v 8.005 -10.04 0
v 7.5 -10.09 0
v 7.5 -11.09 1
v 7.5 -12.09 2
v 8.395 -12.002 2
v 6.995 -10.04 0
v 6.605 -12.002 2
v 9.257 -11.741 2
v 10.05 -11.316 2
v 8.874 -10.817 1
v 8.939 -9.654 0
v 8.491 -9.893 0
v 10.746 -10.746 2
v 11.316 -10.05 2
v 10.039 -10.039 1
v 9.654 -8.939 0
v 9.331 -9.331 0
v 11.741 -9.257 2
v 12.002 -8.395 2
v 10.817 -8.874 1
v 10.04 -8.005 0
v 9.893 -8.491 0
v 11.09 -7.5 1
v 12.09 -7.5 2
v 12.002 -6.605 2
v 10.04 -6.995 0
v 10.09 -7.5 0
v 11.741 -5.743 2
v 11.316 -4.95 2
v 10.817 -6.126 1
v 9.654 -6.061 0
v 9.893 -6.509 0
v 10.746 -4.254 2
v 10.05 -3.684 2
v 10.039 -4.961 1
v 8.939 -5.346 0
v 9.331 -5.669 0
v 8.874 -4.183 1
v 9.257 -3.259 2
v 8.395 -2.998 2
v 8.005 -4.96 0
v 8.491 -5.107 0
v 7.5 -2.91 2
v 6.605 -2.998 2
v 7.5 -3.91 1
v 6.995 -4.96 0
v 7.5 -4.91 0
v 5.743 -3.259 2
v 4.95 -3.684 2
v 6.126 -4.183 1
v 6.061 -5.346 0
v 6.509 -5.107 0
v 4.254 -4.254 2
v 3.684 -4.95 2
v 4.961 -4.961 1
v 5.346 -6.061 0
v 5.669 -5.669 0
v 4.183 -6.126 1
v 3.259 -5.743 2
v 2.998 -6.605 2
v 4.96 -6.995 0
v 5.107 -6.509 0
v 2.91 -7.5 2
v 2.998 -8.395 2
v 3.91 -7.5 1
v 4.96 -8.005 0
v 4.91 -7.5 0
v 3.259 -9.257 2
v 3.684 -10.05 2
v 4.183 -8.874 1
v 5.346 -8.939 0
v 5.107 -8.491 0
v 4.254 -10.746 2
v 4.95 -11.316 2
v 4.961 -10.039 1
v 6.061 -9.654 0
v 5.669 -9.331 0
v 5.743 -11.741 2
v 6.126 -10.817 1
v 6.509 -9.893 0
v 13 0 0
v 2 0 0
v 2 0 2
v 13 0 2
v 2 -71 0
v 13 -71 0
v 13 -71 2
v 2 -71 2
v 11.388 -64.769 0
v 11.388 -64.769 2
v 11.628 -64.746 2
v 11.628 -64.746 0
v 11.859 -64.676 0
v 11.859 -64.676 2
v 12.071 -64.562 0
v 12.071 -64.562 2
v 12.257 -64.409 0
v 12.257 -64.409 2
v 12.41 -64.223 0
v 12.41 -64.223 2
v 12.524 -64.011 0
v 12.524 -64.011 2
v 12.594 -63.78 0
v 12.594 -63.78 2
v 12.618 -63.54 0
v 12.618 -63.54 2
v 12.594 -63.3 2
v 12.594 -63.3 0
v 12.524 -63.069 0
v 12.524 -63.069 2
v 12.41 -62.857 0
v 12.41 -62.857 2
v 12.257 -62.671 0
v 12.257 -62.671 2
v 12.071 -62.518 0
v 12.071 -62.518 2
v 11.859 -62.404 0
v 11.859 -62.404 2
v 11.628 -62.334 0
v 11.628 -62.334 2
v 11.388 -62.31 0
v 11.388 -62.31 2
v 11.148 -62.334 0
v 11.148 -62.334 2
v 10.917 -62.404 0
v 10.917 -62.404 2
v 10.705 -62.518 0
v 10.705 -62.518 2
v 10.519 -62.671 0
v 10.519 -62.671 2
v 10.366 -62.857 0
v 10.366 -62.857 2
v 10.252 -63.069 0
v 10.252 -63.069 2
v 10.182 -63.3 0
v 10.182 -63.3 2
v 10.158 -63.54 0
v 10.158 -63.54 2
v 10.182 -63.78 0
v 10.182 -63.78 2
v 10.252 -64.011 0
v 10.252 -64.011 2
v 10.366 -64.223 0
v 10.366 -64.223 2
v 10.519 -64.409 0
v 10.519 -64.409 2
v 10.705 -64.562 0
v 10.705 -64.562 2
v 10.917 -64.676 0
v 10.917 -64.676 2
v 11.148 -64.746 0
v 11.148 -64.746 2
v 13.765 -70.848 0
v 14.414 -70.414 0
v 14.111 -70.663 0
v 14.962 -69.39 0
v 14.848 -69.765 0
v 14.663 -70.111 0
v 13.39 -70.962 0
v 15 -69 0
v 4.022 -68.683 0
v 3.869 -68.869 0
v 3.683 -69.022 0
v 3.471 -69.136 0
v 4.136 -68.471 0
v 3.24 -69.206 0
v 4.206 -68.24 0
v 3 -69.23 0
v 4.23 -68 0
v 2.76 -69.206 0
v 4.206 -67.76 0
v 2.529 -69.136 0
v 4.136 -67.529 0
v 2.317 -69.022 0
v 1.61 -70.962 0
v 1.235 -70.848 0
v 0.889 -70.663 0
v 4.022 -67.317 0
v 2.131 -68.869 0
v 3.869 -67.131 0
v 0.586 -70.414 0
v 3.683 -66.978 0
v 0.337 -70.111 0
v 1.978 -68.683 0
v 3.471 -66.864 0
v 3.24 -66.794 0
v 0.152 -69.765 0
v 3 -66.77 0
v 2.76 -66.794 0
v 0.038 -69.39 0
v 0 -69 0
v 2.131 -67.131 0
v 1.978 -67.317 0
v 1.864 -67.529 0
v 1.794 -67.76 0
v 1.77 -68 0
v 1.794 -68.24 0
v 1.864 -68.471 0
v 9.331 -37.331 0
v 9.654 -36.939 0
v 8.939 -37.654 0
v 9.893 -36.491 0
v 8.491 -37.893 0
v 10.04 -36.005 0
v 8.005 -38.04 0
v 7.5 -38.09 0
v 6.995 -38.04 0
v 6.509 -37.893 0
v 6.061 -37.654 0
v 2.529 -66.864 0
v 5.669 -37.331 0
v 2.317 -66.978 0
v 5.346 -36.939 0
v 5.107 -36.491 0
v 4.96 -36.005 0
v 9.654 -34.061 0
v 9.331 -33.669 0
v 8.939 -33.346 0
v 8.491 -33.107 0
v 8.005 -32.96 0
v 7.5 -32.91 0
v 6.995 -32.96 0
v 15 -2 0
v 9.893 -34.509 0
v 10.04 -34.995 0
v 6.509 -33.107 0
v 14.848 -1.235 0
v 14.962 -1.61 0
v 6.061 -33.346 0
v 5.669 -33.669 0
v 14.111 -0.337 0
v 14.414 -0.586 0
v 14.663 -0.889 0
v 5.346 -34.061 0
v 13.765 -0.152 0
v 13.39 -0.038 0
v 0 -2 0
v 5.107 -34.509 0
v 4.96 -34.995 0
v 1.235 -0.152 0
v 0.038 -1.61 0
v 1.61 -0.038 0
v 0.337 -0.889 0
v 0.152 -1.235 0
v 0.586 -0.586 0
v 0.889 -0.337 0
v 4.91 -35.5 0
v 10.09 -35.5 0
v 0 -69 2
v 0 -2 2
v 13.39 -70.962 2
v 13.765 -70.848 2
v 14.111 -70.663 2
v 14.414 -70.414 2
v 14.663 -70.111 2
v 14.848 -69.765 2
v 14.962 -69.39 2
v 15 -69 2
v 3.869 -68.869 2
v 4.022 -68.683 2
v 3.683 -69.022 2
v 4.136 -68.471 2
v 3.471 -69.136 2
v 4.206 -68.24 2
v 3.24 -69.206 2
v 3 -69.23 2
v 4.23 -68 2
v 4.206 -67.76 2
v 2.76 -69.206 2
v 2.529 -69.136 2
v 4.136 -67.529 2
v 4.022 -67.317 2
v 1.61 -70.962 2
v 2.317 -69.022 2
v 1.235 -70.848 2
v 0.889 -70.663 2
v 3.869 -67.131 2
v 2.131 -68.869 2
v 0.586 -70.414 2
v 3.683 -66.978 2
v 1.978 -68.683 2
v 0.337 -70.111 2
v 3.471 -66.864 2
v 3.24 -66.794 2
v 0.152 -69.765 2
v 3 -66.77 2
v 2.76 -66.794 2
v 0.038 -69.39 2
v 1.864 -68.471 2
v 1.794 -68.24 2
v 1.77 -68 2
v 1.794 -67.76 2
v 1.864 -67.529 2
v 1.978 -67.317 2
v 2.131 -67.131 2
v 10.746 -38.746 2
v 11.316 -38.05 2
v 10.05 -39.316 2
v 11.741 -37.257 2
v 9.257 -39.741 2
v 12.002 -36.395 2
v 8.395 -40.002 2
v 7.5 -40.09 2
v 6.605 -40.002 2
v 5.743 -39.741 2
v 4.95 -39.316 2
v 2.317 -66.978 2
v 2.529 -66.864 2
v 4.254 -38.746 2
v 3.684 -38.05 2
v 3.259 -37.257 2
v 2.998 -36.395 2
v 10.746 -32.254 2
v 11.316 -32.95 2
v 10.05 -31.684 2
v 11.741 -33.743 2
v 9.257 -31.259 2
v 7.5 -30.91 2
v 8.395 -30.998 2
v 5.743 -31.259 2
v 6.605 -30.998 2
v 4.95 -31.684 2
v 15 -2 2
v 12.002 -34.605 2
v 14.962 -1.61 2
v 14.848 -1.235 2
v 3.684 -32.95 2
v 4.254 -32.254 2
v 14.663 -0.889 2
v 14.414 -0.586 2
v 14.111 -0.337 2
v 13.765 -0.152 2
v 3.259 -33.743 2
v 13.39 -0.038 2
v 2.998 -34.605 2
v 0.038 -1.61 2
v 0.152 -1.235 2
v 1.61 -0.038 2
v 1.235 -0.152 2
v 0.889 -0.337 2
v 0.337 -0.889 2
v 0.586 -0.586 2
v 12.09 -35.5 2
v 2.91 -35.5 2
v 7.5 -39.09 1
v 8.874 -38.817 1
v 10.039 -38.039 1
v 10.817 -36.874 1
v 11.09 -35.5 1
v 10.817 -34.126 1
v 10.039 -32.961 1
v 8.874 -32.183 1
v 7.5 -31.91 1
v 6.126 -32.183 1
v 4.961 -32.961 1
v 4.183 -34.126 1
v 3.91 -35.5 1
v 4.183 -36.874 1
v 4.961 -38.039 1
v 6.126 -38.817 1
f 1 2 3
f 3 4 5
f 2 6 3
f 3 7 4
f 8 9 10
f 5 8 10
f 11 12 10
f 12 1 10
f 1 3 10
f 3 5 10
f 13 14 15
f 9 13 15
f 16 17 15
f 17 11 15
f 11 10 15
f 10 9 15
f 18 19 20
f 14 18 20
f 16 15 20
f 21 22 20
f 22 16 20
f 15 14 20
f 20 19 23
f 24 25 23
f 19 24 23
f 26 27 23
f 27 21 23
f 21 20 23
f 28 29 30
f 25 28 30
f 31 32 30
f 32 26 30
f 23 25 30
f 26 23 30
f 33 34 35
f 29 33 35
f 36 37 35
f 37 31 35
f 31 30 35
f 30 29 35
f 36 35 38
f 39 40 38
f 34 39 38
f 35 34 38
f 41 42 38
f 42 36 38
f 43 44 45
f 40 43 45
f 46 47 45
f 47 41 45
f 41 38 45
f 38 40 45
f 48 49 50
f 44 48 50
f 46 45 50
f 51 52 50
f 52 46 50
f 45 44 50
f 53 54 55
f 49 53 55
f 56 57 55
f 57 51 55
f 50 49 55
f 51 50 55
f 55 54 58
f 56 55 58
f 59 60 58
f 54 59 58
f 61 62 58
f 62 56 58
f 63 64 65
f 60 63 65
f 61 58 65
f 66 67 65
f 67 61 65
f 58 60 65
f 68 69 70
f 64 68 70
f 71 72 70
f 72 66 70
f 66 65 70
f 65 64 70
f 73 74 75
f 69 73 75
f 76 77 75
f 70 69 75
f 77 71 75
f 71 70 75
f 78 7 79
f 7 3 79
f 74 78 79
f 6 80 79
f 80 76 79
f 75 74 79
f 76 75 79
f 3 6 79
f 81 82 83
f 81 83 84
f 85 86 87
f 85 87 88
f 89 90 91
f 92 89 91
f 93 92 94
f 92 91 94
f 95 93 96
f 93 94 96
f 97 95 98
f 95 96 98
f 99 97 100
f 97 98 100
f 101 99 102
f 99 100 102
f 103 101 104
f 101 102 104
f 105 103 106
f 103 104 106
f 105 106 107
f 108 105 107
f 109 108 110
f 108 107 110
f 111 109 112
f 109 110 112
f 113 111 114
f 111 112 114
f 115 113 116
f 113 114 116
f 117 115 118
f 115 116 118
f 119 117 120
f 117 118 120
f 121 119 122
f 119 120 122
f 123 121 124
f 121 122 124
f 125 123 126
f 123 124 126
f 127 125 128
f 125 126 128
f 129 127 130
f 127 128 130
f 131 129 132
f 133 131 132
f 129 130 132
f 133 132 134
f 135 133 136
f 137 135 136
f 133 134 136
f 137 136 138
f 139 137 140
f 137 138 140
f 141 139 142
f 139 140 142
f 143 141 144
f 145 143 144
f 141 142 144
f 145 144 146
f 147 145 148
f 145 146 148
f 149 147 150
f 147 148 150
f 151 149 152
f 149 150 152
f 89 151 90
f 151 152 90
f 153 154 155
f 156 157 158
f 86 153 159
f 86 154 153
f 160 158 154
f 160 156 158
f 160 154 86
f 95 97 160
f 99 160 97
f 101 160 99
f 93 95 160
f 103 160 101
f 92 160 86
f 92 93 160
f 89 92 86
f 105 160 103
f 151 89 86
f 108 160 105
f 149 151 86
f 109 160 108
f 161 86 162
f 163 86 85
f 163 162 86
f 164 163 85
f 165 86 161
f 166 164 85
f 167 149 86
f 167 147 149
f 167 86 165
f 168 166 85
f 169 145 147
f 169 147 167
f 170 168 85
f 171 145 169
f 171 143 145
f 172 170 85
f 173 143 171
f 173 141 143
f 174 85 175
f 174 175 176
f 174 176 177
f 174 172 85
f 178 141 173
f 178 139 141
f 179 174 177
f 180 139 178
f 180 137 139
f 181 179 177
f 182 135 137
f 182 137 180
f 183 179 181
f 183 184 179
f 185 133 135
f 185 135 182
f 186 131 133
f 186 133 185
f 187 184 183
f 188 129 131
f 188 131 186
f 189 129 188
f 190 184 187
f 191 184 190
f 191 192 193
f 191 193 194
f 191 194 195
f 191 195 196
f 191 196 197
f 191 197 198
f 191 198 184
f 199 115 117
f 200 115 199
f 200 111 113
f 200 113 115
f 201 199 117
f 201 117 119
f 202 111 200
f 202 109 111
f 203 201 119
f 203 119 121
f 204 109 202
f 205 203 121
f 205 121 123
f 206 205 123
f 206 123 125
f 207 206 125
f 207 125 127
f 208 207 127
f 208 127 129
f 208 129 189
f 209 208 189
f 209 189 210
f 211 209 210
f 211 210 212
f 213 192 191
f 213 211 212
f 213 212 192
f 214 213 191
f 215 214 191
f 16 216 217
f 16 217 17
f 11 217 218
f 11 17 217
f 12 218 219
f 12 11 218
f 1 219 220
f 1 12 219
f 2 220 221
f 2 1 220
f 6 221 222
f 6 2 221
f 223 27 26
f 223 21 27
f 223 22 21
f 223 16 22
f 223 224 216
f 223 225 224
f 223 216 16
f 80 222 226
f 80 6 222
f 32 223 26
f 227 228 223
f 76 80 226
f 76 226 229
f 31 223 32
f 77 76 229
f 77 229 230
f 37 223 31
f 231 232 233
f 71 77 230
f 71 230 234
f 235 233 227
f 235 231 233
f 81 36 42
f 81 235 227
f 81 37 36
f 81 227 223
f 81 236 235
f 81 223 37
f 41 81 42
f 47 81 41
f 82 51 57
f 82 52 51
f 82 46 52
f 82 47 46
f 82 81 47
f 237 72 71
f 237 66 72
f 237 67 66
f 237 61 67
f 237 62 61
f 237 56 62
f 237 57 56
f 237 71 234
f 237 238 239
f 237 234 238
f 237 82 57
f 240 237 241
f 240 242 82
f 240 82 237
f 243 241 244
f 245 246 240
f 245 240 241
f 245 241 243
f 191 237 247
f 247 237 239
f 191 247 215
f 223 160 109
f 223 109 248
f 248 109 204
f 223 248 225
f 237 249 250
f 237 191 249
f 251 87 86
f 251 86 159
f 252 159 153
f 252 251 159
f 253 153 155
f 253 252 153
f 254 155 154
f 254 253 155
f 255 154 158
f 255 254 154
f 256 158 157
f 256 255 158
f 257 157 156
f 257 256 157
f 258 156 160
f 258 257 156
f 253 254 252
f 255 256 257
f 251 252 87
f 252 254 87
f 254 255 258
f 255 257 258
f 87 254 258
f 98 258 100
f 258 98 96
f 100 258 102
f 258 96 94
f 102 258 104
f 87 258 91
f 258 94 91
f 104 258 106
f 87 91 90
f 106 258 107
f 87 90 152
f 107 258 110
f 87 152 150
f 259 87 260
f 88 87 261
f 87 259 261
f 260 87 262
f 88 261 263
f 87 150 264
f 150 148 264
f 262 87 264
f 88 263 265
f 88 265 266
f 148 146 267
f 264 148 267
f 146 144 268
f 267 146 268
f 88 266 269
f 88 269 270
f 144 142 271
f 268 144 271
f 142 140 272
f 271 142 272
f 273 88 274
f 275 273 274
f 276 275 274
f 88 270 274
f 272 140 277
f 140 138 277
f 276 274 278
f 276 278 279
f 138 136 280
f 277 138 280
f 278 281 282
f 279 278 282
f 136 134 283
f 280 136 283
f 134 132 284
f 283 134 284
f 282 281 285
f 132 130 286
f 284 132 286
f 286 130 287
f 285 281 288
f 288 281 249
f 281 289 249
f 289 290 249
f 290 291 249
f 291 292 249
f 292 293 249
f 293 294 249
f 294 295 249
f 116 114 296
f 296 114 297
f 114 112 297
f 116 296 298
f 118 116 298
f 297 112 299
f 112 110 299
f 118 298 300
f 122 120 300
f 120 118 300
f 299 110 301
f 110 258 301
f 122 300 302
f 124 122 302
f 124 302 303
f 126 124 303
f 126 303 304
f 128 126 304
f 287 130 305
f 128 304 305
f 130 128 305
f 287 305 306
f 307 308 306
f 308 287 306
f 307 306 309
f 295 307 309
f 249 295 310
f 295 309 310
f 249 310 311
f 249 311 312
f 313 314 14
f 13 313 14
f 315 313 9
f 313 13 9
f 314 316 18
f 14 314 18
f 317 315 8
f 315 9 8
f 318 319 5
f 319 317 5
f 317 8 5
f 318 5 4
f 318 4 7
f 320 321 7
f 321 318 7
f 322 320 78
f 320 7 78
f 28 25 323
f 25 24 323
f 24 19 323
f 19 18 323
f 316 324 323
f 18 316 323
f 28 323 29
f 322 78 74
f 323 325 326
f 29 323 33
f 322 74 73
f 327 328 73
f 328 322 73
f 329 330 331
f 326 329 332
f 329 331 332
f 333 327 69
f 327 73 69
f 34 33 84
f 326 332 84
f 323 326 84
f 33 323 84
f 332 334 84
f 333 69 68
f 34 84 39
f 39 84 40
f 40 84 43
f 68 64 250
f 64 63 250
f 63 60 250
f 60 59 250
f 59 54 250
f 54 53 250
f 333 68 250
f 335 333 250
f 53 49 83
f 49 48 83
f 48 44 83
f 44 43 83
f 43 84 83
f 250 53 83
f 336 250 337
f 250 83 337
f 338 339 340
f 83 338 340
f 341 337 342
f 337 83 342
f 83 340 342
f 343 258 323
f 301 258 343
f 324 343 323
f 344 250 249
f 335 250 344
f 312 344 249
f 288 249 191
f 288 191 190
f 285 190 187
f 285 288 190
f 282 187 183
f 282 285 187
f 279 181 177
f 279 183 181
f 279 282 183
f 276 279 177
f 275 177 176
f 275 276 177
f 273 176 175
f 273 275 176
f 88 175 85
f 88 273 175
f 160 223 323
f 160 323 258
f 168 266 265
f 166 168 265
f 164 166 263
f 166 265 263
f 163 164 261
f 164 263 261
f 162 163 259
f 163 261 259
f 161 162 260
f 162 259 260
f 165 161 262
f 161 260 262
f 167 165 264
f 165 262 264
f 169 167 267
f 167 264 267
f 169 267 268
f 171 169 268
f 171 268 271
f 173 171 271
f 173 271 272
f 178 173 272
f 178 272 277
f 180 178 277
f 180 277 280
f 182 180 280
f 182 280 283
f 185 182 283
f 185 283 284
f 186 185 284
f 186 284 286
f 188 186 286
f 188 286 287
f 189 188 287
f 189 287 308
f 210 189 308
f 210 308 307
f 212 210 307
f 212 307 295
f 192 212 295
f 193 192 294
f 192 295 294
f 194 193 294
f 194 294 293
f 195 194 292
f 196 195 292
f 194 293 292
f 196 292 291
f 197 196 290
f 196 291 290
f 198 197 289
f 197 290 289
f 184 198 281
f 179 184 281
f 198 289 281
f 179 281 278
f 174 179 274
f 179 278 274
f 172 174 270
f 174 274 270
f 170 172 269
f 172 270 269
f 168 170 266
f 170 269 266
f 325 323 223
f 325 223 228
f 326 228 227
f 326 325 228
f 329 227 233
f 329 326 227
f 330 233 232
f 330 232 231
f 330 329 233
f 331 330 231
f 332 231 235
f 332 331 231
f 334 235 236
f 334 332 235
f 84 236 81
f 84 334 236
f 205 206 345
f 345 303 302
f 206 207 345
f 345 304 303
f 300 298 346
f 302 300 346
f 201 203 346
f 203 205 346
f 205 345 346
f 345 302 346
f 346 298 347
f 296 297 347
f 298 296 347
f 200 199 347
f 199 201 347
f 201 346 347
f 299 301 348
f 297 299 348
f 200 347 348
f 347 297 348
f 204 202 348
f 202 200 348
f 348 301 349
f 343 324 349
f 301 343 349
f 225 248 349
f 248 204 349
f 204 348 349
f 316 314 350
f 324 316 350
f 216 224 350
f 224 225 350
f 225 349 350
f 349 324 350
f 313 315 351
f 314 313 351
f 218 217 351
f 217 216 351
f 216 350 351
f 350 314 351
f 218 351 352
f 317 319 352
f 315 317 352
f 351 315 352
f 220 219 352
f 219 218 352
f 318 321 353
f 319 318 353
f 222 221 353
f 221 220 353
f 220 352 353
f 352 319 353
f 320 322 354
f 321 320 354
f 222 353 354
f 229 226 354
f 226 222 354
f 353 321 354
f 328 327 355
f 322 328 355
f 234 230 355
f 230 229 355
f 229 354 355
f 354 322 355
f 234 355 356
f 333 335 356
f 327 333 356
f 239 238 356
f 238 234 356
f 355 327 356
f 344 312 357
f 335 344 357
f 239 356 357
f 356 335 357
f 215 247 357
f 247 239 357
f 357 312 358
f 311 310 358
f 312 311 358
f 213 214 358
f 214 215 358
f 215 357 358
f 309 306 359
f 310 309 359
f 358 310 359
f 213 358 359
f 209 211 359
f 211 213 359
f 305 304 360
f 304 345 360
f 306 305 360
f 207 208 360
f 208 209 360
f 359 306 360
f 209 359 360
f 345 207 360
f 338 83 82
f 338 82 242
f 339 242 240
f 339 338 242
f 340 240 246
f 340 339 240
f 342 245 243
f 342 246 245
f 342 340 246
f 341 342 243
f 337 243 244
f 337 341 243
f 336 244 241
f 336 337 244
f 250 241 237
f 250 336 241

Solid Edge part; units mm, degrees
sketch "Sketch1" plane through (0, 0, 0) normal (0, 0, 1) x (1, 0, 0)
  line L0 (15, -71) -> (0, -71)
  line L1 (0, -71) -> (0, 0)
  line L2 (0, 0) -> (15, 0)
  line L3 (15, 0) -> (15, -71)
extrude "Protrusion1" add sketch "Sketch1" along normal blind 2
hole "Bohrung_1" at (3, -68, 2) direction (0, 0, -1) diameter 2.459 end through all
hole "Hole1" at (11.388, -63.54, 2) direction (0, 0, -1) diameter 2.459 end through all
hole "Bohrung_3" at (7.5, -7.5, 2) direction (0, 0, -1) diameter 4.3 end through all countersink diameter 9.18 countersink angle 90
hole "Hole2" at (7.5, -35.5, 2) direction (0, 0, -1) diameter 4.3 end through all countersink diameter 9.18 countersink angle 90
fillet "Verrundung_1" radius 2 4 edges at (15, 0, 1) (0, 0, 1) (15, -71, 1) (0, -71, 1)
